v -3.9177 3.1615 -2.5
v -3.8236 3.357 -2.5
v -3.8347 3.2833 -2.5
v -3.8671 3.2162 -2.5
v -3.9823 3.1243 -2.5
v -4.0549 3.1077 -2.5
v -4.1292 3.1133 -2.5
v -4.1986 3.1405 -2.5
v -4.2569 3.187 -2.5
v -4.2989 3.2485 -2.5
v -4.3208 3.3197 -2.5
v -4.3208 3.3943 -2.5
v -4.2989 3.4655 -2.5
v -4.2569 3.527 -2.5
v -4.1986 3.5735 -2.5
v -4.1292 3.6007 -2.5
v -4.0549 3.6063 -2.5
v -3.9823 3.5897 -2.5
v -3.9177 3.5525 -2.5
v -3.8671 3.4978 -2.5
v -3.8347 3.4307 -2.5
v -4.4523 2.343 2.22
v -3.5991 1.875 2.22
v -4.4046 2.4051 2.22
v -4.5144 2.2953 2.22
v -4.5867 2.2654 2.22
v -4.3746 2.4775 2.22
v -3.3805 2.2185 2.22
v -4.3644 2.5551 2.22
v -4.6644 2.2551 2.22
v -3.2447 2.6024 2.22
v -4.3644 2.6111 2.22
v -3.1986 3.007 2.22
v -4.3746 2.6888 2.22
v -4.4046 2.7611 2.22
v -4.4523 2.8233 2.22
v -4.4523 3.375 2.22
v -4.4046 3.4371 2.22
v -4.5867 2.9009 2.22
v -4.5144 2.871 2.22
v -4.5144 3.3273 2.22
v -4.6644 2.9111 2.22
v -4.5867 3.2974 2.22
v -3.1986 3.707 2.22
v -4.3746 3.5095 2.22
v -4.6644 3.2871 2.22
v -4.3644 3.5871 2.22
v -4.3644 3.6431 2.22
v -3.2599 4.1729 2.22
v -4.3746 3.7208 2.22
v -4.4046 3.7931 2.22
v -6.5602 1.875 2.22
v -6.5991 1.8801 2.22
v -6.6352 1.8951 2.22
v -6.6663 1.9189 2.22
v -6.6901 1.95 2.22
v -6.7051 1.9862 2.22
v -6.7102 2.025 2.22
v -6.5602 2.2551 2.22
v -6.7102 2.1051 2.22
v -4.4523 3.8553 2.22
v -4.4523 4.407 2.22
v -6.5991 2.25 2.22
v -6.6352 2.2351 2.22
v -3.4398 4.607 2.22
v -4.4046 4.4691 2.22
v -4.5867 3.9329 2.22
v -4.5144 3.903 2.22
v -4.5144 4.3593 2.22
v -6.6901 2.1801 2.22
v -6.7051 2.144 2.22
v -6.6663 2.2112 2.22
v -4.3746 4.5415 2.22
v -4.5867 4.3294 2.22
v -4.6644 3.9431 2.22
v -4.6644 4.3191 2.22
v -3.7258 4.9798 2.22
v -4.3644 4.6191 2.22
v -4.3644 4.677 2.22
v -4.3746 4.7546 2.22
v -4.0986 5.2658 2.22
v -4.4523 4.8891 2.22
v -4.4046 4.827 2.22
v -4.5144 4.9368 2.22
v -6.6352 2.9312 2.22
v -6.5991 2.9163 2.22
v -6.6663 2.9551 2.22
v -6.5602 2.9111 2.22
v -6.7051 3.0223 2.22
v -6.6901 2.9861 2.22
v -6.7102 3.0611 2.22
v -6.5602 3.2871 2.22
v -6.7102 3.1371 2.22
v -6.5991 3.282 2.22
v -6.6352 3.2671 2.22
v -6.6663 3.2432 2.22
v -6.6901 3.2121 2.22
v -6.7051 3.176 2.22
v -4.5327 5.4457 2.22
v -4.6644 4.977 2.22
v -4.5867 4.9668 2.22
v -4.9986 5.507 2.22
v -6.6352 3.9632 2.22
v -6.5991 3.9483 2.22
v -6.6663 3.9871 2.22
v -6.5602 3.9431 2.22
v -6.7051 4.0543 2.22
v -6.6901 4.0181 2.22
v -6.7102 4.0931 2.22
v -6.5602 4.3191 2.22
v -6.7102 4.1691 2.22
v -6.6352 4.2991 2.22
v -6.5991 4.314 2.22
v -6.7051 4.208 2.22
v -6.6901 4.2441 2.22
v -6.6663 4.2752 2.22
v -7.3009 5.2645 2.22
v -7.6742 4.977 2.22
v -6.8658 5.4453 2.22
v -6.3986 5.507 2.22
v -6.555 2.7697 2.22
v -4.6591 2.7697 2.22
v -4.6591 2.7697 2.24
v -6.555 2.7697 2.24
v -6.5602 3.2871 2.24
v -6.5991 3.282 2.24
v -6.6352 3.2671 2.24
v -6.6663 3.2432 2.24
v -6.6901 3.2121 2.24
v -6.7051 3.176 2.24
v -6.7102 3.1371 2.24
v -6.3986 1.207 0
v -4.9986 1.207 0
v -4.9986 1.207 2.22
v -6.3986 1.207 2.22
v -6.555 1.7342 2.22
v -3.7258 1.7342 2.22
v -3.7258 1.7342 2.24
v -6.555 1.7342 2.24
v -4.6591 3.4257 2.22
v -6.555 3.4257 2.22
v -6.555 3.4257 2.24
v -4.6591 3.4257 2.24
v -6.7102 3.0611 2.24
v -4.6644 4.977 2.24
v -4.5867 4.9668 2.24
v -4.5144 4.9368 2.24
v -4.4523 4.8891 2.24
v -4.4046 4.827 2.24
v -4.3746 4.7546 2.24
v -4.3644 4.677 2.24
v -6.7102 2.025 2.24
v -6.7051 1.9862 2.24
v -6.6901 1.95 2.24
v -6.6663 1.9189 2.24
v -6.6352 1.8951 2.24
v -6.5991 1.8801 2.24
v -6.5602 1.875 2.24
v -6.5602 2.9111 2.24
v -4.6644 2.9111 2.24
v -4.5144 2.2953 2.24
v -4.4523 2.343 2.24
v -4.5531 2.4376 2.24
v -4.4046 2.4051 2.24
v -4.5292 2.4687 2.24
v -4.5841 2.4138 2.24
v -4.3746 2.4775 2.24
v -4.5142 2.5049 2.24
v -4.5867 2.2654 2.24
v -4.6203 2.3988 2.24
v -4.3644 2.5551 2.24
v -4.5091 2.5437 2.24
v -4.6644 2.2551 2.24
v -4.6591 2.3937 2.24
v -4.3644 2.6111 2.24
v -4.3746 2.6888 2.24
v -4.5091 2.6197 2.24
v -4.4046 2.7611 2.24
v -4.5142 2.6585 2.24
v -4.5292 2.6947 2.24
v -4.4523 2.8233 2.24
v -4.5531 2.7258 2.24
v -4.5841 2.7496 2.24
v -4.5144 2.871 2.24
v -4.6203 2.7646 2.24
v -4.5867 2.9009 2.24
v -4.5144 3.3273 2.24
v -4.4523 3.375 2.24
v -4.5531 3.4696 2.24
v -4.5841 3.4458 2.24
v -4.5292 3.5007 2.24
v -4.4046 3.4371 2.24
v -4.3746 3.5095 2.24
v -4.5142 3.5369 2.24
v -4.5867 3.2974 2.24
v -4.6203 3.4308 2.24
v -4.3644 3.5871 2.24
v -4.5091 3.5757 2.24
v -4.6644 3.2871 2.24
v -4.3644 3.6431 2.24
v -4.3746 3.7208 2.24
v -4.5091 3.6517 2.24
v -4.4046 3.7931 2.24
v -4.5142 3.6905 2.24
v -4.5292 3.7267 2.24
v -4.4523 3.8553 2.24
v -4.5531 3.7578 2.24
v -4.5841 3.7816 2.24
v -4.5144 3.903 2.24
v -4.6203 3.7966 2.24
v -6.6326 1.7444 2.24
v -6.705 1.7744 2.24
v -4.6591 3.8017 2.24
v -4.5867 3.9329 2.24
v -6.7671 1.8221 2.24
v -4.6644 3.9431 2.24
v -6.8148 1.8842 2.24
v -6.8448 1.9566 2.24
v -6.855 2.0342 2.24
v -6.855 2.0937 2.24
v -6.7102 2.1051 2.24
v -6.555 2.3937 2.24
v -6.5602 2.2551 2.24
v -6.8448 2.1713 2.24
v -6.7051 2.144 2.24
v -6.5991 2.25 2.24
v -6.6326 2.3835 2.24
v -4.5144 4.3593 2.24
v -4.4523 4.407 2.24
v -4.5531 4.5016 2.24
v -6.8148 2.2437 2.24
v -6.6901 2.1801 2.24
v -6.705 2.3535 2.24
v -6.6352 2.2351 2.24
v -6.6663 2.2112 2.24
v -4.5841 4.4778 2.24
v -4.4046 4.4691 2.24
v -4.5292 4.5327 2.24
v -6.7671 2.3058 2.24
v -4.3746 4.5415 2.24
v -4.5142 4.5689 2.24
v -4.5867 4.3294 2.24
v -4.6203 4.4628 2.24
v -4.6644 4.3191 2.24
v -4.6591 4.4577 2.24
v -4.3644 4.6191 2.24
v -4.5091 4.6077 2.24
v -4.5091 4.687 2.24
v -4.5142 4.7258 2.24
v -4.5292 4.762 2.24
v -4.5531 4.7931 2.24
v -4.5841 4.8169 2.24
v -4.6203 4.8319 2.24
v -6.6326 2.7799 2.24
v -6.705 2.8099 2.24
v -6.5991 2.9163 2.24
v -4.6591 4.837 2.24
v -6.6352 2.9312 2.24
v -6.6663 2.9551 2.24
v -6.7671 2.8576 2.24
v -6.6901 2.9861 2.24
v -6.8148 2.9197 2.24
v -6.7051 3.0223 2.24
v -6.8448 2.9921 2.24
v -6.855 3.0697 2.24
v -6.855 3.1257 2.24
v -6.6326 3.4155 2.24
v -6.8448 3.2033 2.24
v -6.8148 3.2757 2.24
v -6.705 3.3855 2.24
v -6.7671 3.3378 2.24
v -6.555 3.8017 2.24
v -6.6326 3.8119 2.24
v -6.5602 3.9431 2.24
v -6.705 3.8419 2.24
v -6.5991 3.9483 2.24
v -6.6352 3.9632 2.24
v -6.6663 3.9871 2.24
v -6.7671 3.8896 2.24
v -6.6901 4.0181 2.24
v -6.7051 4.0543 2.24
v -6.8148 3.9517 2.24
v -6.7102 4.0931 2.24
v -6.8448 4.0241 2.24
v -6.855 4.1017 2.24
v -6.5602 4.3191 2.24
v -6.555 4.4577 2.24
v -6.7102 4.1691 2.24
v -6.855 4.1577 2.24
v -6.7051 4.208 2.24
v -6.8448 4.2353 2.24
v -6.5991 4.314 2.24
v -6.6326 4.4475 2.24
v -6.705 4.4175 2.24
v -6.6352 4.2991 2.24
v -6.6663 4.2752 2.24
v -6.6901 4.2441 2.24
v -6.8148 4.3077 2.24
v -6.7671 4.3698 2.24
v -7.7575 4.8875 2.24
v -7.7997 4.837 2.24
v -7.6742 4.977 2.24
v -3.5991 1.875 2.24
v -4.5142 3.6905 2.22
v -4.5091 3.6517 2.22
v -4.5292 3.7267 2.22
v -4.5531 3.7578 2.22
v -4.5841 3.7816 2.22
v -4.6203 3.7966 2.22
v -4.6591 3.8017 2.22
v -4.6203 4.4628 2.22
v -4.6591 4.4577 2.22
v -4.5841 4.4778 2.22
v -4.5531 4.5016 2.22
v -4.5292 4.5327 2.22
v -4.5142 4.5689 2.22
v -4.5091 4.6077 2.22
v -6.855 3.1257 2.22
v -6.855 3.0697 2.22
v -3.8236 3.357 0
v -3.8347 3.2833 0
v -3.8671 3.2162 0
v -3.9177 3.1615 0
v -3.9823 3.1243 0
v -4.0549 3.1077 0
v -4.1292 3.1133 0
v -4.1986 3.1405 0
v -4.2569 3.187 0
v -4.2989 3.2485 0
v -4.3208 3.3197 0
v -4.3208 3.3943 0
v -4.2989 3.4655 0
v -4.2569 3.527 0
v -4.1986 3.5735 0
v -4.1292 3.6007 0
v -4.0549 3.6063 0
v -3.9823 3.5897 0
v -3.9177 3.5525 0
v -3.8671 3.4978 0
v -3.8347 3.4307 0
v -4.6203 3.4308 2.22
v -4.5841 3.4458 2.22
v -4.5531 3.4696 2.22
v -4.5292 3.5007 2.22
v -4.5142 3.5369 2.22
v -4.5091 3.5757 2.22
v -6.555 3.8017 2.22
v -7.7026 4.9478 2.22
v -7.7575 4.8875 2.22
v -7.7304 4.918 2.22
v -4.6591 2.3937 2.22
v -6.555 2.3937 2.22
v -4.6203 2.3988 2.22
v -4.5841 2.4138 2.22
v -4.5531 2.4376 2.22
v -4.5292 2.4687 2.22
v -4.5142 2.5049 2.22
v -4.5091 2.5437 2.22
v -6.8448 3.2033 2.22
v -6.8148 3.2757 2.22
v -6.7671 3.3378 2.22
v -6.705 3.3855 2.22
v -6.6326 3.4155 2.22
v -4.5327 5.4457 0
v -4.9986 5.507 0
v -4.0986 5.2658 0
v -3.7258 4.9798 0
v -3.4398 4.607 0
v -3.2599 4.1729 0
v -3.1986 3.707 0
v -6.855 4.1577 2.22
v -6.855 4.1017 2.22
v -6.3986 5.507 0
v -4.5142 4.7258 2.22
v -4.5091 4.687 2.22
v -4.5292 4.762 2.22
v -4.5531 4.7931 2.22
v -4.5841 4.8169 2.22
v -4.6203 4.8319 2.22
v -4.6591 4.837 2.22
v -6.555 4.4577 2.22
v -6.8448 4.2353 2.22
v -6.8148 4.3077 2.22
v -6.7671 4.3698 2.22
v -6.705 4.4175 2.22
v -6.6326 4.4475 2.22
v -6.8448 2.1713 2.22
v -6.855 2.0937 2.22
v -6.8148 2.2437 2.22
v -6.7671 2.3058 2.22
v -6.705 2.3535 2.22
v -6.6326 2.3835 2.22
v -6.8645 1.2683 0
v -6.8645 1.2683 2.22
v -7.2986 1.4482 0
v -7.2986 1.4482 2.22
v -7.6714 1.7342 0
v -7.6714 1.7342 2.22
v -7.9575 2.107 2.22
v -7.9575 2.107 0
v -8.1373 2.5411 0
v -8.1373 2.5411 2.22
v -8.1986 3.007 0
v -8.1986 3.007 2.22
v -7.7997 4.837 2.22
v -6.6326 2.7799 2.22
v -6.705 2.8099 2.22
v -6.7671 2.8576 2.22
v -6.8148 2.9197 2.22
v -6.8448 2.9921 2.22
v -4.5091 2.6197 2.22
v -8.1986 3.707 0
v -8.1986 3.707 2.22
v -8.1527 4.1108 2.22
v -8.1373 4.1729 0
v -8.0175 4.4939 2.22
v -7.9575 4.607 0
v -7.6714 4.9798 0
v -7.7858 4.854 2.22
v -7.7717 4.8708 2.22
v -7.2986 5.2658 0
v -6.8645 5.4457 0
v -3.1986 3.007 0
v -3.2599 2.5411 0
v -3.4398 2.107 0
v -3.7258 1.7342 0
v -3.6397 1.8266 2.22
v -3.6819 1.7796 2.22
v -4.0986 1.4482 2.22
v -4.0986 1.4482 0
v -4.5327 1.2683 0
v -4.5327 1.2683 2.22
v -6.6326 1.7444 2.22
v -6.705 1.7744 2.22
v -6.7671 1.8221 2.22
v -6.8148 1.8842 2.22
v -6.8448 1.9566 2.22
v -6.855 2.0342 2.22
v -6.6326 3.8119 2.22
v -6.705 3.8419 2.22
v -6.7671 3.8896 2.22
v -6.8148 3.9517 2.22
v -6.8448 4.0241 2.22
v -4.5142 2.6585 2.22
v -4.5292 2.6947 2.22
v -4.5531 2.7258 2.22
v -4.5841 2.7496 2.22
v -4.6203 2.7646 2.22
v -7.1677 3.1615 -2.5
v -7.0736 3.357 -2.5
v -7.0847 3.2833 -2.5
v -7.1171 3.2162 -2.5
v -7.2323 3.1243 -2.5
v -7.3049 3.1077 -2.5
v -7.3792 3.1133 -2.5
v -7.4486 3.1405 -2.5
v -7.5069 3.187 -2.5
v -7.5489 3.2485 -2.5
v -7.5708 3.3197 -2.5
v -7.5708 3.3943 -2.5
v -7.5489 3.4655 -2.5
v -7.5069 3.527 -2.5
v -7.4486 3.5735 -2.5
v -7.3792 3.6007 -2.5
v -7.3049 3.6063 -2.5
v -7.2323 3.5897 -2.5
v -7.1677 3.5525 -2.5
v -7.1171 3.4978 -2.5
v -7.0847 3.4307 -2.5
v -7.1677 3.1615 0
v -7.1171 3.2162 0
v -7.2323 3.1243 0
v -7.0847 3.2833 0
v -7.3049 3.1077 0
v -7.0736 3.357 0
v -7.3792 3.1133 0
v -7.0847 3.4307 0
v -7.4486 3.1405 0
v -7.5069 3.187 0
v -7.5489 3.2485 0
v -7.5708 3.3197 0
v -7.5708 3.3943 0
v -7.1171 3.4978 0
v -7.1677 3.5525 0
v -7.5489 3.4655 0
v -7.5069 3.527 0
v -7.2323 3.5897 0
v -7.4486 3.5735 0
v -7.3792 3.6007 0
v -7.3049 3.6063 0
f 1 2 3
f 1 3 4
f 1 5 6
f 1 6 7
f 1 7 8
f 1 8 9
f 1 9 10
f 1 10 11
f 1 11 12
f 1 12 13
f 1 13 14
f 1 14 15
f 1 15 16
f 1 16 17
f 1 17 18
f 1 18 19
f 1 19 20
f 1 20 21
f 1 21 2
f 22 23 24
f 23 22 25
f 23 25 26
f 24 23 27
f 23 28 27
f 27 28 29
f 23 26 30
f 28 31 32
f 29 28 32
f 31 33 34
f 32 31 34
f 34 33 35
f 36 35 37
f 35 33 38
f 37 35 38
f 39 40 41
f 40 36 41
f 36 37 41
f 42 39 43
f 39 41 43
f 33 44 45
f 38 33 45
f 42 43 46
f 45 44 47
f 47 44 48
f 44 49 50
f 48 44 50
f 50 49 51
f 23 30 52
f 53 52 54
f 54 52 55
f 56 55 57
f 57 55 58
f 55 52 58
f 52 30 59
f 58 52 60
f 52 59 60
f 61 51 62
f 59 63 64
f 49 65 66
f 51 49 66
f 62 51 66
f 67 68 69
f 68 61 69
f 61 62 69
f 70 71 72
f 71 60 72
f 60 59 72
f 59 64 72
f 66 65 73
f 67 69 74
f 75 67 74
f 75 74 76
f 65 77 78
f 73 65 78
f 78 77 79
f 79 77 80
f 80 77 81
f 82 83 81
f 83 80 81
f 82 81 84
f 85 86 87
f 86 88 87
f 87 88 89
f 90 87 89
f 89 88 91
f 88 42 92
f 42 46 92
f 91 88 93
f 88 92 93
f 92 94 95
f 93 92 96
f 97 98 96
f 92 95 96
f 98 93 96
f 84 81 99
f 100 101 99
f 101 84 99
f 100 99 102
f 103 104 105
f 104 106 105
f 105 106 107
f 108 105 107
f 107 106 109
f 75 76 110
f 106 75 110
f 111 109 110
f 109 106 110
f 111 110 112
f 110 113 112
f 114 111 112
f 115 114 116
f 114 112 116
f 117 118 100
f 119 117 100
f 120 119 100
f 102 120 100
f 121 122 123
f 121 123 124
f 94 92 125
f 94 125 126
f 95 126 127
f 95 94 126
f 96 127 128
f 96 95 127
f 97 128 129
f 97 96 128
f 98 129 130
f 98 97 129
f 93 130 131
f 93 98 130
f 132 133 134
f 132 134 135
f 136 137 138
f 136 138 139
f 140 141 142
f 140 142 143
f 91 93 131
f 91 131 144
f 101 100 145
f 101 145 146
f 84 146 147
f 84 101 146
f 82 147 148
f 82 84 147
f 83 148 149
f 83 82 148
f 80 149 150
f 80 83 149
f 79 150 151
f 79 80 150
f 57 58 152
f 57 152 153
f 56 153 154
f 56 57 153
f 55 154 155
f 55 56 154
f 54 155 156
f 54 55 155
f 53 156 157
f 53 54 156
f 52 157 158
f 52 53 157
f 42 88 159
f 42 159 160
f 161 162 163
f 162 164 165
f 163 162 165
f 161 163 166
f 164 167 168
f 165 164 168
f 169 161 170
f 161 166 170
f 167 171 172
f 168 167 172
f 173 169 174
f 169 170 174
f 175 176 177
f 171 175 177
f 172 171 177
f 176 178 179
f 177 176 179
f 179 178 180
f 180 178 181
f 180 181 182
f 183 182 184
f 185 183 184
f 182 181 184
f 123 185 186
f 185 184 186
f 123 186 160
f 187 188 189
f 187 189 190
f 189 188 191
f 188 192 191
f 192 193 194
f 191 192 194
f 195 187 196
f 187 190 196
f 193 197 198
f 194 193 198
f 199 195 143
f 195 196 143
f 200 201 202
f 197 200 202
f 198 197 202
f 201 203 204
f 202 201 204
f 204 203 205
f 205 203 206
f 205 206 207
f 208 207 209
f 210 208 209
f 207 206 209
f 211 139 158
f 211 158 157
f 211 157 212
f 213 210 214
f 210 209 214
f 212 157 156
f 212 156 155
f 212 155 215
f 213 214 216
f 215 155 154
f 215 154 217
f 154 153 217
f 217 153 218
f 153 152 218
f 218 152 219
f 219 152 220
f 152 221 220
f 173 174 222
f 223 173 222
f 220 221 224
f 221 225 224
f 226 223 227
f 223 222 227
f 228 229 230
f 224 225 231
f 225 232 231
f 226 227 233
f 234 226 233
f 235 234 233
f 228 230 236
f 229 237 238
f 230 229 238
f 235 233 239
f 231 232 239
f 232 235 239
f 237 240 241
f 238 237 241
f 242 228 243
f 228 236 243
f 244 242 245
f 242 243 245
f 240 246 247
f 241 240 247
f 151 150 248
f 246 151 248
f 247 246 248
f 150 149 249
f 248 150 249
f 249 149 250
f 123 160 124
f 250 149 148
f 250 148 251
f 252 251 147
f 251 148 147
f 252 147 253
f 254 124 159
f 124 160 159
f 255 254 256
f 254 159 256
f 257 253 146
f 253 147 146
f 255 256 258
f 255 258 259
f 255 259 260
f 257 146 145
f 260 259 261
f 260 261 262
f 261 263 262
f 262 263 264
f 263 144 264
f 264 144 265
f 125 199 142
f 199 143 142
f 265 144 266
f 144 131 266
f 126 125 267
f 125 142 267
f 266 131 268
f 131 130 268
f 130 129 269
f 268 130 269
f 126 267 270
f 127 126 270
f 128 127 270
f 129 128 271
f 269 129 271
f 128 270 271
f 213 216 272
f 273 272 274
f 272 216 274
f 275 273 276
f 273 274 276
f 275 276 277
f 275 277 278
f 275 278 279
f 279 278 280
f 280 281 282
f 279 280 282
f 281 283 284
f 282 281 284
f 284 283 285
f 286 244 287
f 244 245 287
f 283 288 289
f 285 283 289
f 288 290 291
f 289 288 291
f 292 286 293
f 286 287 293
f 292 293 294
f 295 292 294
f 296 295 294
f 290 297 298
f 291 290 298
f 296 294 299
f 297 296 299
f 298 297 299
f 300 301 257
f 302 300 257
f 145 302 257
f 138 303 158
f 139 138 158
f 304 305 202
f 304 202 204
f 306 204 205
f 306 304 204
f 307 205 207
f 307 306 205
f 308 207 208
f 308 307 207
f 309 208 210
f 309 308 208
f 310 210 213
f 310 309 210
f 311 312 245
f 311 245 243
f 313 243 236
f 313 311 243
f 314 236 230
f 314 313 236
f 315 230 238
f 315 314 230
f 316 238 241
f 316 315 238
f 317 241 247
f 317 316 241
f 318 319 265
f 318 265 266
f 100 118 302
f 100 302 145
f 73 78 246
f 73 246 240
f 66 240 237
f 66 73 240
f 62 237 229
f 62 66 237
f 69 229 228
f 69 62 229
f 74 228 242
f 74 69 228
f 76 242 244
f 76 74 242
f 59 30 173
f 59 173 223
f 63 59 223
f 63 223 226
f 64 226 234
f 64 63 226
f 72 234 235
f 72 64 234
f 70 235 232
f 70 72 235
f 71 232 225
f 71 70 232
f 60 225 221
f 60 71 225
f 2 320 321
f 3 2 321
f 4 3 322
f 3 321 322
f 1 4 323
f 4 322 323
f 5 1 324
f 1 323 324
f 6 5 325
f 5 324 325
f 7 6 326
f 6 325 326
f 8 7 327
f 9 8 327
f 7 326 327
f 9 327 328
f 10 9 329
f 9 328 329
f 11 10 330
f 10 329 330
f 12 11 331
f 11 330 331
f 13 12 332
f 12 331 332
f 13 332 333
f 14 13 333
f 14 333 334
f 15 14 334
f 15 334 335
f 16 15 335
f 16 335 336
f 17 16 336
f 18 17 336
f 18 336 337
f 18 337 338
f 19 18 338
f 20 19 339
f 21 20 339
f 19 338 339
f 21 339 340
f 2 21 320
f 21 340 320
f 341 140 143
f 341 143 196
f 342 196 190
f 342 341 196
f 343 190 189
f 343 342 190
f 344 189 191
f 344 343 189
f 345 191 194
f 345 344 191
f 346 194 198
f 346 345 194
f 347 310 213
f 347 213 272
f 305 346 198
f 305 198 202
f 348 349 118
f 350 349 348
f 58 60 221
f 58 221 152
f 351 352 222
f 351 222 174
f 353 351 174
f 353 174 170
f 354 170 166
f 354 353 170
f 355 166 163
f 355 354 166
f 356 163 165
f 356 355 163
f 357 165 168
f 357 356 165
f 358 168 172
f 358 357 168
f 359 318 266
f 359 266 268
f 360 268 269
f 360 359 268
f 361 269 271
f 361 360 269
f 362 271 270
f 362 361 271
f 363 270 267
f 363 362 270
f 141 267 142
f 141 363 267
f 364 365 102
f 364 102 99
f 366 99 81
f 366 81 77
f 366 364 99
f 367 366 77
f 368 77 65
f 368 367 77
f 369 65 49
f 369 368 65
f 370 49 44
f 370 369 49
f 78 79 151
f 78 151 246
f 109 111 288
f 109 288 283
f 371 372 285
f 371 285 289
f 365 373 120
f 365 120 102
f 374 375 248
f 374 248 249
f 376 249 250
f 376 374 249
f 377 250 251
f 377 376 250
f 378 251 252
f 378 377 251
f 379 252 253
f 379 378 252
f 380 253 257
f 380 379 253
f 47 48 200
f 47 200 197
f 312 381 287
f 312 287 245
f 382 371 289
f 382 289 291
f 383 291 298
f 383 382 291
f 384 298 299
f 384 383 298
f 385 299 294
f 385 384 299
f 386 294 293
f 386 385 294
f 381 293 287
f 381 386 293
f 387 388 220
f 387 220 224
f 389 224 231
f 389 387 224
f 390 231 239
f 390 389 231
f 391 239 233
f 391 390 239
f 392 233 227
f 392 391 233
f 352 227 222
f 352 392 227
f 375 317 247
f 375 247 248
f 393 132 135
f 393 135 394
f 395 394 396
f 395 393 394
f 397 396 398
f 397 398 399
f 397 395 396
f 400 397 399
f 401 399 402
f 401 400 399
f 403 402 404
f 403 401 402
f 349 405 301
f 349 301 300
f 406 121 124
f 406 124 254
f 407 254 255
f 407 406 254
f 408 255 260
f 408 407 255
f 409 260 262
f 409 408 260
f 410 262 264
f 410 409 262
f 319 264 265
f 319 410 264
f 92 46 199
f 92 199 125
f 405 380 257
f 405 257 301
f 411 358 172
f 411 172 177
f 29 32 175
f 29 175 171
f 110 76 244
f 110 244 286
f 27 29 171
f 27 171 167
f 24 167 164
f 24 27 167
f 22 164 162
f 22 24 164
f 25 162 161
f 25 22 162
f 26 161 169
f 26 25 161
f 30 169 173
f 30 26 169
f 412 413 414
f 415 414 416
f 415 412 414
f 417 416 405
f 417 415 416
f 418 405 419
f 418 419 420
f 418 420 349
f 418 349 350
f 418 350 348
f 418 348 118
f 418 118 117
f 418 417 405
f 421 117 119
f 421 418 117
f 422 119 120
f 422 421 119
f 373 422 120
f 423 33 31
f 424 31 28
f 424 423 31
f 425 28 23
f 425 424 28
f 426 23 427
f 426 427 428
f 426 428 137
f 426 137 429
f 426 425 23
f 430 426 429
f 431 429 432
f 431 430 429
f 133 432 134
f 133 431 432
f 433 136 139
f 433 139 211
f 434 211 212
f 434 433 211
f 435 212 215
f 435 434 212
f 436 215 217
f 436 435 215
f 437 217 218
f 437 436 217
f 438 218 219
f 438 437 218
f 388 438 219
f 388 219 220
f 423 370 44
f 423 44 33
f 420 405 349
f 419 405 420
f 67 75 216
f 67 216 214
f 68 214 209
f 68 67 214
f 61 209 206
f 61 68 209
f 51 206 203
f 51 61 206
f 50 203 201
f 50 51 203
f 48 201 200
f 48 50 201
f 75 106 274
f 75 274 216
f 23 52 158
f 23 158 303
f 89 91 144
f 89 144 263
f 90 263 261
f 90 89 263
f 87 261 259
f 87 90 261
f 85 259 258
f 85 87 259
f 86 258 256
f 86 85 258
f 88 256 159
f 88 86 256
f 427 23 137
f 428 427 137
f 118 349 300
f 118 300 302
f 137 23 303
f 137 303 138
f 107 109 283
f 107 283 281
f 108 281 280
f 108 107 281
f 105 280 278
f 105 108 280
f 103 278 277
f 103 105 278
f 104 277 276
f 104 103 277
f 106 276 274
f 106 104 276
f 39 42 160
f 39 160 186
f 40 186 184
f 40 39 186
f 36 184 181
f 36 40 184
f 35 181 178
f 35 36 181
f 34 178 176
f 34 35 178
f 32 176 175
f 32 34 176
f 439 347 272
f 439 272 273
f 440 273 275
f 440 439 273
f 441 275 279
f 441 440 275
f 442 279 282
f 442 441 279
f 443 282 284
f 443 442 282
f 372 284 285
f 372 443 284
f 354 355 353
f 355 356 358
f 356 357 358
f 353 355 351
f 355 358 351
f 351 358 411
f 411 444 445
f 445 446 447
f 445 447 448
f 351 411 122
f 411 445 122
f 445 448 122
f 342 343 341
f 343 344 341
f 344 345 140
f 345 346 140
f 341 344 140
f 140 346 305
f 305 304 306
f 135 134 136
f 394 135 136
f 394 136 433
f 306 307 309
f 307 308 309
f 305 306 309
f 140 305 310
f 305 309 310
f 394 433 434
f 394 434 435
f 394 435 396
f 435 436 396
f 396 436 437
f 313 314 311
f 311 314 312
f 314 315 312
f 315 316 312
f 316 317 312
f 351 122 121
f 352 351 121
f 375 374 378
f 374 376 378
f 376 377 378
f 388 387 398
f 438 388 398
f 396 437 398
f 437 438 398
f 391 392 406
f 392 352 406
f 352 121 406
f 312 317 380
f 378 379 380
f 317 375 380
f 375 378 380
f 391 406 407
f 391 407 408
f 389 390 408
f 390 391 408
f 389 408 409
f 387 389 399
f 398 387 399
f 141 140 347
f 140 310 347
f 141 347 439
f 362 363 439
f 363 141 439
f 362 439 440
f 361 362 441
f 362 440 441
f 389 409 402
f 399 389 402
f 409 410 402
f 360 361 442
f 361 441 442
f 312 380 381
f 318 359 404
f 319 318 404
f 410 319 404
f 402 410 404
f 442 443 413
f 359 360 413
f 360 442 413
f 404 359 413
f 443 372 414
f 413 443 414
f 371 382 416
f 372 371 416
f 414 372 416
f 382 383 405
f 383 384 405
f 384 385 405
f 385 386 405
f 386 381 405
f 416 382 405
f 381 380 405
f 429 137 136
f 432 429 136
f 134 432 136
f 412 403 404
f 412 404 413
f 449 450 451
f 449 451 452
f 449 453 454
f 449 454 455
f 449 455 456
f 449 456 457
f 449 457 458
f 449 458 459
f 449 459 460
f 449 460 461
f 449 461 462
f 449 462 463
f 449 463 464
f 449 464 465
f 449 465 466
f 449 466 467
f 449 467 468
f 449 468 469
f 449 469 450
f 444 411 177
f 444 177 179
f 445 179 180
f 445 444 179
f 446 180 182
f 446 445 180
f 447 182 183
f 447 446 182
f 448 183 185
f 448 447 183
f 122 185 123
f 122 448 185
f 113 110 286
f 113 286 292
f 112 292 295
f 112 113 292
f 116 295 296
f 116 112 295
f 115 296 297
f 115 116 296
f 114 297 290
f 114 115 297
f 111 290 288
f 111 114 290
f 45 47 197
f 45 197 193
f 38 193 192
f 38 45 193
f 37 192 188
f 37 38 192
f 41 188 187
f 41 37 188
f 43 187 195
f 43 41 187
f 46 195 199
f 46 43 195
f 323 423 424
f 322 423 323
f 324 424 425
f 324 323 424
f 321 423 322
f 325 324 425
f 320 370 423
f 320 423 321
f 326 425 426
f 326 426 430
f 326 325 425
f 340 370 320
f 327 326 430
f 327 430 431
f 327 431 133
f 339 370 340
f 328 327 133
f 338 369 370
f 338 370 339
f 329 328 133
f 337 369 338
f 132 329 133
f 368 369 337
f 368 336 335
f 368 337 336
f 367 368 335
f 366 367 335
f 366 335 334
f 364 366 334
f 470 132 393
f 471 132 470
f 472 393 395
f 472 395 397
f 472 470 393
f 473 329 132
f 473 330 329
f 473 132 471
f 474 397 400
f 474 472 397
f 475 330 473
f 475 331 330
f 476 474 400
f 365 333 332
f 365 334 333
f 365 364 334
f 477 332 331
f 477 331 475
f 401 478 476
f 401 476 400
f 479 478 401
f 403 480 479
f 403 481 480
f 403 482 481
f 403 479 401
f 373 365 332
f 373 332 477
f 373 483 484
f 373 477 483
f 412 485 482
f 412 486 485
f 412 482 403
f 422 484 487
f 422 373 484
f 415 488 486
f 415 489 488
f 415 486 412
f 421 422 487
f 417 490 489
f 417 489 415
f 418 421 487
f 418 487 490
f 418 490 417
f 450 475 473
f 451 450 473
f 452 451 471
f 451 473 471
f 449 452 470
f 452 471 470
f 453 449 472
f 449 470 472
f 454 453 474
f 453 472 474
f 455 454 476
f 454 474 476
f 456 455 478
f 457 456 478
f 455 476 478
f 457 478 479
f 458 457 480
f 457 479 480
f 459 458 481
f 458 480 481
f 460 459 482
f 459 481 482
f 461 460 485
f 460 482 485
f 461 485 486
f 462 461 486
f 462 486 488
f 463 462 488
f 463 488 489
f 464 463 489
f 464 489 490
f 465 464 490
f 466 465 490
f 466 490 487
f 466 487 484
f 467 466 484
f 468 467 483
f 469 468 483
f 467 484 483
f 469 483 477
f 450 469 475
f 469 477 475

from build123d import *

# Parameters (mm, degrees)
EXTRUDE1_DEPTH = 2.22
EXTRUDE6_DEPTH = 0.02
SKETCH2_R      = 0.25
EXTRUDE7_DEPTH = 2.5


with BuildPart() as part:
    # Sketch1 → Extrude1 (new body)
    with BuildSketch(Plane.XY):
        with BuildLine():
            Line((-6.39861095, 5.506998303), (-4.99861095, 5.506998303))
            ThreePointArc((-4.99861095, 5.506998303), (-3.725818744, 4.979790509), (-3.19861095, 3.706998303))
            Line((-3.19861095, 3.706998303), (-3.19861095, 3.006998303))
            ThreePointArc((-3.19861095, 3.006998303), (-3.725818744, 1.734206097), (-4.99861095, 1.206998303))
            Line((-4.99861095, 1.206998303), (-6.39861095, 1.206998303))
            ThreePointArc((-6.39861095, 1.206998303), (-7.671403156, 1.734206097), (-8.19861095, 3.006998303))
            Line((-8.19861095, 3.006998303), (-8.19861095, 3.706998303))
            ThreePointArc((-8.19861095, 3.706998303), (-7.671403156, 4.979790509), (-6.39861095, 5.506998303))
        make_face()
    extrude(amount=EXTRUDE1_DEPTH)

    # Sketch3 → Extrude6 (add)
    with BuildSketch(Plane.XY.offset(2.22)):
        with BuildLine():
            Line((-4.659129836, 4.836998303), (-7.799717656, 4.836998303))
            Line((-7.799717656, 4.836998303), (-7.757450007, 4.887488208))
            Line((-7.757450007, 4.887488208), (-7.674189251, 4.976998303))
            Line((-7.674189251, 4.976998303), (-4.664395148, 4.976998303))
            ThreePointArc((-4.664395148, 4.976998303), (-4.452263114, 4.889130337), (-4.364395148, 4.676998303))
            Line((-4.364395148, 4.676998303), (-4.364395148, 4.619148396))
            ThreePointArc((-4.364395148, 4.619148396), (-4.452263114, 4.407016361), (-4.664395148, 4.319148396))
            Line((-4.664395148, 4.319148396), (-6.560237828, 4.319148396))
            ThreePointArc((-6.560237828, 4.319148396), (-6.666303845, 4.275214413), (-6.710237828, 4.169148396))
            Line((-6.710237828, 4.169148396), (-6.710237828, 4.093148396))
            ThreePointArc((-6.710237828, 4.093148396), (-6.666303845, 3.987082379), (-6.560237828, 3.943148396))
            Line((-6.560237828, 3.943148396), (-4.664395148, 3.943148396))
            ThreePointArc((-4.664395148, 3.943148396), (-4.452263114, 3.85528043), (-4.364395148, 3.643148396))
            Line((-4.364395148, 3.643148396), (-4.364395148, 3.587148396))
            ThreePointArc((-4.364395148, 3.587148396), (-4.452263114, 3.375016361), (-4.664395148, 3.287148396))
            Line((-4.664395148, 3.287148396), (-6.560237828, 3.287148396))
            ThreePointArc((-6.560237828, 3.287148396), (-6.666303845, 3.243214413), (-6.710237828, 3.137148396))
            Line((-6.710237828, 3.137148396), (-6.710237828, 3.061148396))
            ThreePointArc((-6.710237828, 3.061148396), (-6.666303845, 2.955082379), (-6.560237828, 2.911148396))
            Line((-6.560237828, 2.911148396), (-4.664395148, 2.911148396))
            ThreePointArc((-4.664395148, 2.911148396), (-4.452263114, 2.82328043), (-4.364395148, 2.611148396))
            Line((-4.364395148, 2.611148396), (-4.364395148, 2.555148396))
            ThreePointArc((-4.364395148, 2.555148396), (-4.452263114, 2.343016361), (-4.664395148, 2.255148396))
            Line((-4.664395148, 2.255148396), (-6.560237828, 2.255148396))
            ThreePointArc((-6.560237828, 2.255148396), (-6.666303845, 2.211214413), (-6.710237828, 2.105148396))
            Line((-6.710237828, 2.105148396), (-6.710237828, 2.024997149))
            ThreePointArc((-6.710237828, 2.024997149), (-6.666303845, 1.918931132), (-6.560237828, 1.874997149))
            Line((-6.560237828, 1.874997149), (-3.599120547, 1.874997149))
            Line((-3.599120547, 1.874997149), (-3.725818744, 1.734206097))
            Line((-3.725818744, 1.734206097), (-6.554972516, 1.734206097))
            ThreePointArc((-6.554972516, 1.734206097), (-6.767104551, 1.822074063), (-6.854972516, 2.034206097))
            Line((-6.854972516, 2.034206097), (-6.854972516, 2.093703593))
            ThreePointArc((-6.854972516, 2.093703593), (-6.767104551, 2.305835627), (-6.554972516, 2.393703593))
            Line((-6.554972516, 2.393703593), (-4.659129836, 2.393703593))
            ThreePointArc((-4.659129836, 2.393703593), (-4.553063819, 2.437637576), (-4.509129836, 2.543703593))
            Line((-4.509129836, 2.543703593), (-4.509129836, 2.619703593))
            ThreePointArc((-4.509129836, 2.619703593), (-4.553063819, 2.72576961), (-4.659129836, 2.769703593))
            Line((-4.659129836, 2.769703593), (-6.554972516, 2.769703593))
            ThreePointArc((-6.554972516, 2.769703593), (-6.767104551, 2.857571559), (-6.854972516, 3.069703593))
            Line((-6.854972516, 3.069703593), (-6.854972516, 3.125703593))
            ThreePointArc((-6.854972516, 3.125703593), (-6.767104551, 3.337835627), (-6.554972516, 3.425703593))
            Line((-6.554972516, 3.425703593), (-4.659129836, 3.425703593))
            ThreePointArc((-4.659129836, 3.425703593), (-4.553063819, 3.469637576), (-4.509129836, 3.575703593))
            Line((-4.509129836, 3.575703593), (-4.509129836, 3.651703593))
            ThreePointArc((-4.509129836, 3.651703593), (-4.553063819, 3.75776961), (-4.659129836, 3.801703593))
            Line((-4.659129836, 3.801703593), (-6.554972516, 3.801703593))
            ThreePointArc((-6.554972516, 3.801703593), (-6.767104551, 3.889571559), (-6.854972516, 4.101703593))
            Line((-6.854972516, 4.101703593), (-6.854972516, 4.157703593))
            ThreePointArc((-6.854972516, 4.157703593), (-6.767104551, 4.369835627), (-6.554972516, 4.457703593))
            Line((-6.554972516, 4.457703593), (-4.659129836, 4.457703593))
            ThreePointArc((-4.659129836, 4.457703593), (-4.553063819, 4.501637576), (-4.509129836, 4.607703593))
            Line((-4.509129836, 4.607703593), (-4.509129836, 4.686998303))
            ThreePointArc((-4.509129836, 4.686998303), (-4.553063819, 4.79306432), (-4.659129836, 4.836998303))
        make_face()
    extrude(amount=EXTRUDE6_DEPTH)

    # Sketch2 → Extrude7 (add)
    with BuildSketch(Plane(origin=(0, 0, 0), x_dir=(-1, 0, 0), z_dir=(0, 0, -1))):
        with Locations(Location((4.07361095, 3.356998303, 0), (0, 0, 180))):
            Circle(SKETCH2_R)
        with Locations(Location((7.32361095, 3.356998303, 0), (0, 0, 180))):
            Circle(SKETCH2_R)
    extrude(amount=EXTRUDE7_DEPTH)


solid = part.part
